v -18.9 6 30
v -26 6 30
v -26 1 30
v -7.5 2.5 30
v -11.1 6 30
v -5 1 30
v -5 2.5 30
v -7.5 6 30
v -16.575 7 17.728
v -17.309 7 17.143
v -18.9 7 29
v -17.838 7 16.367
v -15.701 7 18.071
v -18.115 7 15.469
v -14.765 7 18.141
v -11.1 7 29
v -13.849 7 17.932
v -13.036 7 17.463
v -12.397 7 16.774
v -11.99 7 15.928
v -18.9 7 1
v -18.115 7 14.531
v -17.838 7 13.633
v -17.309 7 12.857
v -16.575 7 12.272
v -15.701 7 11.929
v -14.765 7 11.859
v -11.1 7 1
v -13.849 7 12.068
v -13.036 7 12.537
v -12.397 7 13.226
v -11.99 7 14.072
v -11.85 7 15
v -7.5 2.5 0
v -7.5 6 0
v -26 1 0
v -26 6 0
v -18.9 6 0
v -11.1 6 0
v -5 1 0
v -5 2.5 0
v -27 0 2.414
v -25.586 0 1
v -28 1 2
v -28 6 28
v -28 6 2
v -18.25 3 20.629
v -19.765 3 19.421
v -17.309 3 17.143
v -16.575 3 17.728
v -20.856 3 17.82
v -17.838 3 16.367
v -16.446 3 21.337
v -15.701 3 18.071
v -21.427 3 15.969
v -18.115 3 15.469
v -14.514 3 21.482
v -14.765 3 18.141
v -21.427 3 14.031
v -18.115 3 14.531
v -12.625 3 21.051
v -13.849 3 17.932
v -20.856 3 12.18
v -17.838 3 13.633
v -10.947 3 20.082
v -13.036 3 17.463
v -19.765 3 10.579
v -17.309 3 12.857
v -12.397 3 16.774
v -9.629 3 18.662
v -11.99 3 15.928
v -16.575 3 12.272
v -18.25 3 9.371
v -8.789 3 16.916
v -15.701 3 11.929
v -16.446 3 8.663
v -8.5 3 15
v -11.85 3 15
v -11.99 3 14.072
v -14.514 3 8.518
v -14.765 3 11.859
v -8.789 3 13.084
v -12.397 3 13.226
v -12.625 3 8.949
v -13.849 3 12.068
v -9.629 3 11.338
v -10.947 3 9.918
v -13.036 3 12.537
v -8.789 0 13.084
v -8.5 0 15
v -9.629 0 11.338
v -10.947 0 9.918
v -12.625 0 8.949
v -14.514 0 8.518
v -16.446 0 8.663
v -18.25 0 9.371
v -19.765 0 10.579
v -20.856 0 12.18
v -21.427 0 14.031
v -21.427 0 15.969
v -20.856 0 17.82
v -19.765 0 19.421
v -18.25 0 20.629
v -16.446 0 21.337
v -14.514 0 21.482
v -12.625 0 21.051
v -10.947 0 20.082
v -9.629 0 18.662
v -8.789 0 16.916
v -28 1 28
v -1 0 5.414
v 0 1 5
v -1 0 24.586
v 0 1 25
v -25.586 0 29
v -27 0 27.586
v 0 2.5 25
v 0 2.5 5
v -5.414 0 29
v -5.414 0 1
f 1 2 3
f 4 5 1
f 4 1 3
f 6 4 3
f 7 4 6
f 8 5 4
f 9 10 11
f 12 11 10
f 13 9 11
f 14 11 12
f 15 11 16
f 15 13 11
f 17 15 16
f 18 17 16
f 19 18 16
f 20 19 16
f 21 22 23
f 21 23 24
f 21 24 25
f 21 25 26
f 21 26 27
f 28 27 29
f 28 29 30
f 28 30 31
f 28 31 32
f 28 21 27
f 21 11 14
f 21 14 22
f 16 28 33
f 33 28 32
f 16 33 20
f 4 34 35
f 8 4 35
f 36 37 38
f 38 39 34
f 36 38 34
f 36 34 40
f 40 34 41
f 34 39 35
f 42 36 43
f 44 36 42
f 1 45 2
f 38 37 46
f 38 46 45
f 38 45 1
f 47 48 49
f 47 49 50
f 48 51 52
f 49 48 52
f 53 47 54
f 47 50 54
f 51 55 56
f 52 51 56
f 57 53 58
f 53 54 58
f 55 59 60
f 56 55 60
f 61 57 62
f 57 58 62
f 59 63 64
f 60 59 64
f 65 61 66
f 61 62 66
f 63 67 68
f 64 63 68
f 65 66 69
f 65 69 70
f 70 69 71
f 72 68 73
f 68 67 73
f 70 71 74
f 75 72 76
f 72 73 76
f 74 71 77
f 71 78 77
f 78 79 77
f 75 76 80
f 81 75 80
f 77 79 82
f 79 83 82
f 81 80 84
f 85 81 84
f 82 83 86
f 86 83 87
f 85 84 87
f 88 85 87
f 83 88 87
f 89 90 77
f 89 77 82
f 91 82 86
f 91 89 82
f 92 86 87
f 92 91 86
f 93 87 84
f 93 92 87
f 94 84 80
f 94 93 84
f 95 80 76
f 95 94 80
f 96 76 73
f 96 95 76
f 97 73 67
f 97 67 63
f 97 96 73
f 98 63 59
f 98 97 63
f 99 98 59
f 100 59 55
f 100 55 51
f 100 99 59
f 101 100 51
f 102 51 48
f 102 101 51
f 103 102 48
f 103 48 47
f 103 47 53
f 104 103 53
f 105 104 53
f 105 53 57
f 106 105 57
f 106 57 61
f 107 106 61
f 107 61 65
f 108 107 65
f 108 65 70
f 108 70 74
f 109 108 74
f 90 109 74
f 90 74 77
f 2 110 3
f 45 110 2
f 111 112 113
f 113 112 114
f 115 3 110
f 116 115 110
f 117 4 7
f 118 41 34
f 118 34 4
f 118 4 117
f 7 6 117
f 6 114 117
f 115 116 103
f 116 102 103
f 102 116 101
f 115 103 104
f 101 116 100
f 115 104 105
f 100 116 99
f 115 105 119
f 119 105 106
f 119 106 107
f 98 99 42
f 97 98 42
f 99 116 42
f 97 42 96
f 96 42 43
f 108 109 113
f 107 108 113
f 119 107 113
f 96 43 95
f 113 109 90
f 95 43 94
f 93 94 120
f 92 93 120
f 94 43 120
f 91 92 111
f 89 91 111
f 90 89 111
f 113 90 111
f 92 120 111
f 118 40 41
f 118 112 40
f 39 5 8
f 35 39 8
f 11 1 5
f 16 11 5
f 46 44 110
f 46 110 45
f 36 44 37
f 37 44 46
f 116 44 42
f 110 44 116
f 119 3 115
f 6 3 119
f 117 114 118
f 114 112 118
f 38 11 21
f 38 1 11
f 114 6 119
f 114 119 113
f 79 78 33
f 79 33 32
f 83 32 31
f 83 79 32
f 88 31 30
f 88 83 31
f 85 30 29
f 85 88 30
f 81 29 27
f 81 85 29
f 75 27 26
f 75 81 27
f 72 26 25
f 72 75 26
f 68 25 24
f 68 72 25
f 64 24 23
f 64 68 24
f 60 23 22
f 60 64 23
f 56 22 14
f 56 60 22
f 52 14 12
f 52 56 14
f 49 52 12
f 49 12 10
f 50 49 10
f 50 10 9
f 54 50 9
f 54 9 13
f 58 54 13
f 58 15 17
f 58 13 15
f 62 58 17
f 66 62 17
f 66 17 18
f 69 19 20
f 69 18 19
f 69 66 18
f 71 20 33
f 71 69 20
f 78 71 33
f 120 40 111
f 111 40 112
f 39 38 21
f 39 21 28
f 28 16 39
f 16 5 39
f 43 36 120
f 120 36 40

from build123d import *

# Parameters (mm, degrees)
CYLINDER004_R     = 6.5
CYLINDER004_DEPTH = 10
CYLINDER005_R     = 3.15
CYLINDER005_DEPTH = 10
BOX005_W          = 16
BOX005_H          = 9
BOX005_DEPTH      = 31
BOX004_W          = 28
BOX004_H          = 6
BOX004_DEPTH      = 30
CHAMFER017_SIZE   = 5
CHAMFER018_SIZE   = 2
CHAMFER019_SIZE   = 1
BOX006_W          = 7.8
BOX006_H          = 2
BOX006_DEPTH      = 30
CHAMFER008_SIZE   = 1


with BuildPart() as cylinder004:
    # Cylinder004 → Cylinder004 (new body)
    with BuildSketch(Plane(origin=(-15, -7, 15), x_dir=(1, 0, 0), z_dir=(0, 1, 0))):
        Circle(CYLINDER004_R)
    extrude(amount=CYLINDER004_DEPTH)


with BuildPart() as cylinder005:
    # Cylinder005 → Cylinder005 (new body)
    with BuildSketch(Plane(origin=(-15, 0, 15), x_dir=(1, 0, 0), z_dir=(0, 1, 0))):
        Circle(CYLINDER005_R)
    extrude(amount=CYLINDER005_DEPTH)


with BuildPart() as cube005:
    # Box005 → Box005 (new body)
    with BuildSketch(Plane(origin=(-7.5, 2.5, 0), x_dir=(1, 0, 0), z_dir=(0, 0, 1))):
        with Locations((8, 4.5)):
            Rectangle(BOX005_W, BOX005_H)
    extrude(amount=BOX005_DEPTH)


with BuildPart() as chamfer019:
    # Box004 → Box004 (new body)
    with BuildSketch(Plane(origin=(-28, 0, 0), x_dir=(1, 0, 0), z_dir=(0, 0, 1))):
        with Locations((14, 3)):
            Rectangle(BOX004_W, BOX004_H)
    extrude(amount=BOX004_DEPTH)

    # Cut002008006002: cut Cube005
    add(cube005.part, mode=Mode.SUBTRACT)

    # Chamfer017
    chamfer017_edges = [chamfer019.edges().sort_by_distance(p)[0] for p in [
        (0, 1.25, 30),
        (0, 1.25, 0),
    ]]
    chamfer(chamfer017_edges, length=CHAMFER017_SIZE)

    # Chamfer018
    chamfer018_edges = [chamfer019.edges().sort_by_distance(p)[0] for p in [
        (-28, 3, 0),
        (-28, 3, 30),
    ]]
    chamfer(chamfer018_edges, length=CHAMFER018_SIZE)

    # Chamfer019
    chamfer019_edges = [chamfer019.edges().sort_by_distance(p)[0] for p in [
        (-15.5, 0, 0),
        (-27, 0, 1),
        (-28, 0, 15),
        (-27, 0, 29),
        (-15.5, 0, 30),
        (-2.5, 0, 27.5),
        (0, 0, 15),
        (-2.5, 0, 2.5),
    ]]
    chamfer(chamfer019_edges, length=CHAMFER019_SIZE)


with BuildPart() as cut002008006004001:
    # Box006 → Box006 (new body)
    with BuildSketch(Plane(origin=(-18.9, 5, 0), x_dir=(1, 0, 0), z_dir=(0, 0, 1))):
        with Locations((3.9, 1)):
            Rectangle(BOX006_W, BOX006_H)
    extrude(amount=BOX006_DEPTH)

    # Chamfer008
    chamfer008_edges = [cut002008006004001.edges().sort_by_distance(p)[0] for p in [
        (-15, 7, 0),
        (-15, 7, 30),
    ]]
    chamfer(chamfer008_edges, length=CHAMFER008_SIZE)

    # Fusion009: union Chamfer019
    add(chamfer019.part)

    # Cut002008006003: cut Cylinder005
    add(cylinder005.part, mode=Mode.SUBTRACT)

    # Cut002008006004: cut Cylinder004
    add(cylinder004.part, mode=Mode.SUBTRACT)


solid = cut002008006004001.part
